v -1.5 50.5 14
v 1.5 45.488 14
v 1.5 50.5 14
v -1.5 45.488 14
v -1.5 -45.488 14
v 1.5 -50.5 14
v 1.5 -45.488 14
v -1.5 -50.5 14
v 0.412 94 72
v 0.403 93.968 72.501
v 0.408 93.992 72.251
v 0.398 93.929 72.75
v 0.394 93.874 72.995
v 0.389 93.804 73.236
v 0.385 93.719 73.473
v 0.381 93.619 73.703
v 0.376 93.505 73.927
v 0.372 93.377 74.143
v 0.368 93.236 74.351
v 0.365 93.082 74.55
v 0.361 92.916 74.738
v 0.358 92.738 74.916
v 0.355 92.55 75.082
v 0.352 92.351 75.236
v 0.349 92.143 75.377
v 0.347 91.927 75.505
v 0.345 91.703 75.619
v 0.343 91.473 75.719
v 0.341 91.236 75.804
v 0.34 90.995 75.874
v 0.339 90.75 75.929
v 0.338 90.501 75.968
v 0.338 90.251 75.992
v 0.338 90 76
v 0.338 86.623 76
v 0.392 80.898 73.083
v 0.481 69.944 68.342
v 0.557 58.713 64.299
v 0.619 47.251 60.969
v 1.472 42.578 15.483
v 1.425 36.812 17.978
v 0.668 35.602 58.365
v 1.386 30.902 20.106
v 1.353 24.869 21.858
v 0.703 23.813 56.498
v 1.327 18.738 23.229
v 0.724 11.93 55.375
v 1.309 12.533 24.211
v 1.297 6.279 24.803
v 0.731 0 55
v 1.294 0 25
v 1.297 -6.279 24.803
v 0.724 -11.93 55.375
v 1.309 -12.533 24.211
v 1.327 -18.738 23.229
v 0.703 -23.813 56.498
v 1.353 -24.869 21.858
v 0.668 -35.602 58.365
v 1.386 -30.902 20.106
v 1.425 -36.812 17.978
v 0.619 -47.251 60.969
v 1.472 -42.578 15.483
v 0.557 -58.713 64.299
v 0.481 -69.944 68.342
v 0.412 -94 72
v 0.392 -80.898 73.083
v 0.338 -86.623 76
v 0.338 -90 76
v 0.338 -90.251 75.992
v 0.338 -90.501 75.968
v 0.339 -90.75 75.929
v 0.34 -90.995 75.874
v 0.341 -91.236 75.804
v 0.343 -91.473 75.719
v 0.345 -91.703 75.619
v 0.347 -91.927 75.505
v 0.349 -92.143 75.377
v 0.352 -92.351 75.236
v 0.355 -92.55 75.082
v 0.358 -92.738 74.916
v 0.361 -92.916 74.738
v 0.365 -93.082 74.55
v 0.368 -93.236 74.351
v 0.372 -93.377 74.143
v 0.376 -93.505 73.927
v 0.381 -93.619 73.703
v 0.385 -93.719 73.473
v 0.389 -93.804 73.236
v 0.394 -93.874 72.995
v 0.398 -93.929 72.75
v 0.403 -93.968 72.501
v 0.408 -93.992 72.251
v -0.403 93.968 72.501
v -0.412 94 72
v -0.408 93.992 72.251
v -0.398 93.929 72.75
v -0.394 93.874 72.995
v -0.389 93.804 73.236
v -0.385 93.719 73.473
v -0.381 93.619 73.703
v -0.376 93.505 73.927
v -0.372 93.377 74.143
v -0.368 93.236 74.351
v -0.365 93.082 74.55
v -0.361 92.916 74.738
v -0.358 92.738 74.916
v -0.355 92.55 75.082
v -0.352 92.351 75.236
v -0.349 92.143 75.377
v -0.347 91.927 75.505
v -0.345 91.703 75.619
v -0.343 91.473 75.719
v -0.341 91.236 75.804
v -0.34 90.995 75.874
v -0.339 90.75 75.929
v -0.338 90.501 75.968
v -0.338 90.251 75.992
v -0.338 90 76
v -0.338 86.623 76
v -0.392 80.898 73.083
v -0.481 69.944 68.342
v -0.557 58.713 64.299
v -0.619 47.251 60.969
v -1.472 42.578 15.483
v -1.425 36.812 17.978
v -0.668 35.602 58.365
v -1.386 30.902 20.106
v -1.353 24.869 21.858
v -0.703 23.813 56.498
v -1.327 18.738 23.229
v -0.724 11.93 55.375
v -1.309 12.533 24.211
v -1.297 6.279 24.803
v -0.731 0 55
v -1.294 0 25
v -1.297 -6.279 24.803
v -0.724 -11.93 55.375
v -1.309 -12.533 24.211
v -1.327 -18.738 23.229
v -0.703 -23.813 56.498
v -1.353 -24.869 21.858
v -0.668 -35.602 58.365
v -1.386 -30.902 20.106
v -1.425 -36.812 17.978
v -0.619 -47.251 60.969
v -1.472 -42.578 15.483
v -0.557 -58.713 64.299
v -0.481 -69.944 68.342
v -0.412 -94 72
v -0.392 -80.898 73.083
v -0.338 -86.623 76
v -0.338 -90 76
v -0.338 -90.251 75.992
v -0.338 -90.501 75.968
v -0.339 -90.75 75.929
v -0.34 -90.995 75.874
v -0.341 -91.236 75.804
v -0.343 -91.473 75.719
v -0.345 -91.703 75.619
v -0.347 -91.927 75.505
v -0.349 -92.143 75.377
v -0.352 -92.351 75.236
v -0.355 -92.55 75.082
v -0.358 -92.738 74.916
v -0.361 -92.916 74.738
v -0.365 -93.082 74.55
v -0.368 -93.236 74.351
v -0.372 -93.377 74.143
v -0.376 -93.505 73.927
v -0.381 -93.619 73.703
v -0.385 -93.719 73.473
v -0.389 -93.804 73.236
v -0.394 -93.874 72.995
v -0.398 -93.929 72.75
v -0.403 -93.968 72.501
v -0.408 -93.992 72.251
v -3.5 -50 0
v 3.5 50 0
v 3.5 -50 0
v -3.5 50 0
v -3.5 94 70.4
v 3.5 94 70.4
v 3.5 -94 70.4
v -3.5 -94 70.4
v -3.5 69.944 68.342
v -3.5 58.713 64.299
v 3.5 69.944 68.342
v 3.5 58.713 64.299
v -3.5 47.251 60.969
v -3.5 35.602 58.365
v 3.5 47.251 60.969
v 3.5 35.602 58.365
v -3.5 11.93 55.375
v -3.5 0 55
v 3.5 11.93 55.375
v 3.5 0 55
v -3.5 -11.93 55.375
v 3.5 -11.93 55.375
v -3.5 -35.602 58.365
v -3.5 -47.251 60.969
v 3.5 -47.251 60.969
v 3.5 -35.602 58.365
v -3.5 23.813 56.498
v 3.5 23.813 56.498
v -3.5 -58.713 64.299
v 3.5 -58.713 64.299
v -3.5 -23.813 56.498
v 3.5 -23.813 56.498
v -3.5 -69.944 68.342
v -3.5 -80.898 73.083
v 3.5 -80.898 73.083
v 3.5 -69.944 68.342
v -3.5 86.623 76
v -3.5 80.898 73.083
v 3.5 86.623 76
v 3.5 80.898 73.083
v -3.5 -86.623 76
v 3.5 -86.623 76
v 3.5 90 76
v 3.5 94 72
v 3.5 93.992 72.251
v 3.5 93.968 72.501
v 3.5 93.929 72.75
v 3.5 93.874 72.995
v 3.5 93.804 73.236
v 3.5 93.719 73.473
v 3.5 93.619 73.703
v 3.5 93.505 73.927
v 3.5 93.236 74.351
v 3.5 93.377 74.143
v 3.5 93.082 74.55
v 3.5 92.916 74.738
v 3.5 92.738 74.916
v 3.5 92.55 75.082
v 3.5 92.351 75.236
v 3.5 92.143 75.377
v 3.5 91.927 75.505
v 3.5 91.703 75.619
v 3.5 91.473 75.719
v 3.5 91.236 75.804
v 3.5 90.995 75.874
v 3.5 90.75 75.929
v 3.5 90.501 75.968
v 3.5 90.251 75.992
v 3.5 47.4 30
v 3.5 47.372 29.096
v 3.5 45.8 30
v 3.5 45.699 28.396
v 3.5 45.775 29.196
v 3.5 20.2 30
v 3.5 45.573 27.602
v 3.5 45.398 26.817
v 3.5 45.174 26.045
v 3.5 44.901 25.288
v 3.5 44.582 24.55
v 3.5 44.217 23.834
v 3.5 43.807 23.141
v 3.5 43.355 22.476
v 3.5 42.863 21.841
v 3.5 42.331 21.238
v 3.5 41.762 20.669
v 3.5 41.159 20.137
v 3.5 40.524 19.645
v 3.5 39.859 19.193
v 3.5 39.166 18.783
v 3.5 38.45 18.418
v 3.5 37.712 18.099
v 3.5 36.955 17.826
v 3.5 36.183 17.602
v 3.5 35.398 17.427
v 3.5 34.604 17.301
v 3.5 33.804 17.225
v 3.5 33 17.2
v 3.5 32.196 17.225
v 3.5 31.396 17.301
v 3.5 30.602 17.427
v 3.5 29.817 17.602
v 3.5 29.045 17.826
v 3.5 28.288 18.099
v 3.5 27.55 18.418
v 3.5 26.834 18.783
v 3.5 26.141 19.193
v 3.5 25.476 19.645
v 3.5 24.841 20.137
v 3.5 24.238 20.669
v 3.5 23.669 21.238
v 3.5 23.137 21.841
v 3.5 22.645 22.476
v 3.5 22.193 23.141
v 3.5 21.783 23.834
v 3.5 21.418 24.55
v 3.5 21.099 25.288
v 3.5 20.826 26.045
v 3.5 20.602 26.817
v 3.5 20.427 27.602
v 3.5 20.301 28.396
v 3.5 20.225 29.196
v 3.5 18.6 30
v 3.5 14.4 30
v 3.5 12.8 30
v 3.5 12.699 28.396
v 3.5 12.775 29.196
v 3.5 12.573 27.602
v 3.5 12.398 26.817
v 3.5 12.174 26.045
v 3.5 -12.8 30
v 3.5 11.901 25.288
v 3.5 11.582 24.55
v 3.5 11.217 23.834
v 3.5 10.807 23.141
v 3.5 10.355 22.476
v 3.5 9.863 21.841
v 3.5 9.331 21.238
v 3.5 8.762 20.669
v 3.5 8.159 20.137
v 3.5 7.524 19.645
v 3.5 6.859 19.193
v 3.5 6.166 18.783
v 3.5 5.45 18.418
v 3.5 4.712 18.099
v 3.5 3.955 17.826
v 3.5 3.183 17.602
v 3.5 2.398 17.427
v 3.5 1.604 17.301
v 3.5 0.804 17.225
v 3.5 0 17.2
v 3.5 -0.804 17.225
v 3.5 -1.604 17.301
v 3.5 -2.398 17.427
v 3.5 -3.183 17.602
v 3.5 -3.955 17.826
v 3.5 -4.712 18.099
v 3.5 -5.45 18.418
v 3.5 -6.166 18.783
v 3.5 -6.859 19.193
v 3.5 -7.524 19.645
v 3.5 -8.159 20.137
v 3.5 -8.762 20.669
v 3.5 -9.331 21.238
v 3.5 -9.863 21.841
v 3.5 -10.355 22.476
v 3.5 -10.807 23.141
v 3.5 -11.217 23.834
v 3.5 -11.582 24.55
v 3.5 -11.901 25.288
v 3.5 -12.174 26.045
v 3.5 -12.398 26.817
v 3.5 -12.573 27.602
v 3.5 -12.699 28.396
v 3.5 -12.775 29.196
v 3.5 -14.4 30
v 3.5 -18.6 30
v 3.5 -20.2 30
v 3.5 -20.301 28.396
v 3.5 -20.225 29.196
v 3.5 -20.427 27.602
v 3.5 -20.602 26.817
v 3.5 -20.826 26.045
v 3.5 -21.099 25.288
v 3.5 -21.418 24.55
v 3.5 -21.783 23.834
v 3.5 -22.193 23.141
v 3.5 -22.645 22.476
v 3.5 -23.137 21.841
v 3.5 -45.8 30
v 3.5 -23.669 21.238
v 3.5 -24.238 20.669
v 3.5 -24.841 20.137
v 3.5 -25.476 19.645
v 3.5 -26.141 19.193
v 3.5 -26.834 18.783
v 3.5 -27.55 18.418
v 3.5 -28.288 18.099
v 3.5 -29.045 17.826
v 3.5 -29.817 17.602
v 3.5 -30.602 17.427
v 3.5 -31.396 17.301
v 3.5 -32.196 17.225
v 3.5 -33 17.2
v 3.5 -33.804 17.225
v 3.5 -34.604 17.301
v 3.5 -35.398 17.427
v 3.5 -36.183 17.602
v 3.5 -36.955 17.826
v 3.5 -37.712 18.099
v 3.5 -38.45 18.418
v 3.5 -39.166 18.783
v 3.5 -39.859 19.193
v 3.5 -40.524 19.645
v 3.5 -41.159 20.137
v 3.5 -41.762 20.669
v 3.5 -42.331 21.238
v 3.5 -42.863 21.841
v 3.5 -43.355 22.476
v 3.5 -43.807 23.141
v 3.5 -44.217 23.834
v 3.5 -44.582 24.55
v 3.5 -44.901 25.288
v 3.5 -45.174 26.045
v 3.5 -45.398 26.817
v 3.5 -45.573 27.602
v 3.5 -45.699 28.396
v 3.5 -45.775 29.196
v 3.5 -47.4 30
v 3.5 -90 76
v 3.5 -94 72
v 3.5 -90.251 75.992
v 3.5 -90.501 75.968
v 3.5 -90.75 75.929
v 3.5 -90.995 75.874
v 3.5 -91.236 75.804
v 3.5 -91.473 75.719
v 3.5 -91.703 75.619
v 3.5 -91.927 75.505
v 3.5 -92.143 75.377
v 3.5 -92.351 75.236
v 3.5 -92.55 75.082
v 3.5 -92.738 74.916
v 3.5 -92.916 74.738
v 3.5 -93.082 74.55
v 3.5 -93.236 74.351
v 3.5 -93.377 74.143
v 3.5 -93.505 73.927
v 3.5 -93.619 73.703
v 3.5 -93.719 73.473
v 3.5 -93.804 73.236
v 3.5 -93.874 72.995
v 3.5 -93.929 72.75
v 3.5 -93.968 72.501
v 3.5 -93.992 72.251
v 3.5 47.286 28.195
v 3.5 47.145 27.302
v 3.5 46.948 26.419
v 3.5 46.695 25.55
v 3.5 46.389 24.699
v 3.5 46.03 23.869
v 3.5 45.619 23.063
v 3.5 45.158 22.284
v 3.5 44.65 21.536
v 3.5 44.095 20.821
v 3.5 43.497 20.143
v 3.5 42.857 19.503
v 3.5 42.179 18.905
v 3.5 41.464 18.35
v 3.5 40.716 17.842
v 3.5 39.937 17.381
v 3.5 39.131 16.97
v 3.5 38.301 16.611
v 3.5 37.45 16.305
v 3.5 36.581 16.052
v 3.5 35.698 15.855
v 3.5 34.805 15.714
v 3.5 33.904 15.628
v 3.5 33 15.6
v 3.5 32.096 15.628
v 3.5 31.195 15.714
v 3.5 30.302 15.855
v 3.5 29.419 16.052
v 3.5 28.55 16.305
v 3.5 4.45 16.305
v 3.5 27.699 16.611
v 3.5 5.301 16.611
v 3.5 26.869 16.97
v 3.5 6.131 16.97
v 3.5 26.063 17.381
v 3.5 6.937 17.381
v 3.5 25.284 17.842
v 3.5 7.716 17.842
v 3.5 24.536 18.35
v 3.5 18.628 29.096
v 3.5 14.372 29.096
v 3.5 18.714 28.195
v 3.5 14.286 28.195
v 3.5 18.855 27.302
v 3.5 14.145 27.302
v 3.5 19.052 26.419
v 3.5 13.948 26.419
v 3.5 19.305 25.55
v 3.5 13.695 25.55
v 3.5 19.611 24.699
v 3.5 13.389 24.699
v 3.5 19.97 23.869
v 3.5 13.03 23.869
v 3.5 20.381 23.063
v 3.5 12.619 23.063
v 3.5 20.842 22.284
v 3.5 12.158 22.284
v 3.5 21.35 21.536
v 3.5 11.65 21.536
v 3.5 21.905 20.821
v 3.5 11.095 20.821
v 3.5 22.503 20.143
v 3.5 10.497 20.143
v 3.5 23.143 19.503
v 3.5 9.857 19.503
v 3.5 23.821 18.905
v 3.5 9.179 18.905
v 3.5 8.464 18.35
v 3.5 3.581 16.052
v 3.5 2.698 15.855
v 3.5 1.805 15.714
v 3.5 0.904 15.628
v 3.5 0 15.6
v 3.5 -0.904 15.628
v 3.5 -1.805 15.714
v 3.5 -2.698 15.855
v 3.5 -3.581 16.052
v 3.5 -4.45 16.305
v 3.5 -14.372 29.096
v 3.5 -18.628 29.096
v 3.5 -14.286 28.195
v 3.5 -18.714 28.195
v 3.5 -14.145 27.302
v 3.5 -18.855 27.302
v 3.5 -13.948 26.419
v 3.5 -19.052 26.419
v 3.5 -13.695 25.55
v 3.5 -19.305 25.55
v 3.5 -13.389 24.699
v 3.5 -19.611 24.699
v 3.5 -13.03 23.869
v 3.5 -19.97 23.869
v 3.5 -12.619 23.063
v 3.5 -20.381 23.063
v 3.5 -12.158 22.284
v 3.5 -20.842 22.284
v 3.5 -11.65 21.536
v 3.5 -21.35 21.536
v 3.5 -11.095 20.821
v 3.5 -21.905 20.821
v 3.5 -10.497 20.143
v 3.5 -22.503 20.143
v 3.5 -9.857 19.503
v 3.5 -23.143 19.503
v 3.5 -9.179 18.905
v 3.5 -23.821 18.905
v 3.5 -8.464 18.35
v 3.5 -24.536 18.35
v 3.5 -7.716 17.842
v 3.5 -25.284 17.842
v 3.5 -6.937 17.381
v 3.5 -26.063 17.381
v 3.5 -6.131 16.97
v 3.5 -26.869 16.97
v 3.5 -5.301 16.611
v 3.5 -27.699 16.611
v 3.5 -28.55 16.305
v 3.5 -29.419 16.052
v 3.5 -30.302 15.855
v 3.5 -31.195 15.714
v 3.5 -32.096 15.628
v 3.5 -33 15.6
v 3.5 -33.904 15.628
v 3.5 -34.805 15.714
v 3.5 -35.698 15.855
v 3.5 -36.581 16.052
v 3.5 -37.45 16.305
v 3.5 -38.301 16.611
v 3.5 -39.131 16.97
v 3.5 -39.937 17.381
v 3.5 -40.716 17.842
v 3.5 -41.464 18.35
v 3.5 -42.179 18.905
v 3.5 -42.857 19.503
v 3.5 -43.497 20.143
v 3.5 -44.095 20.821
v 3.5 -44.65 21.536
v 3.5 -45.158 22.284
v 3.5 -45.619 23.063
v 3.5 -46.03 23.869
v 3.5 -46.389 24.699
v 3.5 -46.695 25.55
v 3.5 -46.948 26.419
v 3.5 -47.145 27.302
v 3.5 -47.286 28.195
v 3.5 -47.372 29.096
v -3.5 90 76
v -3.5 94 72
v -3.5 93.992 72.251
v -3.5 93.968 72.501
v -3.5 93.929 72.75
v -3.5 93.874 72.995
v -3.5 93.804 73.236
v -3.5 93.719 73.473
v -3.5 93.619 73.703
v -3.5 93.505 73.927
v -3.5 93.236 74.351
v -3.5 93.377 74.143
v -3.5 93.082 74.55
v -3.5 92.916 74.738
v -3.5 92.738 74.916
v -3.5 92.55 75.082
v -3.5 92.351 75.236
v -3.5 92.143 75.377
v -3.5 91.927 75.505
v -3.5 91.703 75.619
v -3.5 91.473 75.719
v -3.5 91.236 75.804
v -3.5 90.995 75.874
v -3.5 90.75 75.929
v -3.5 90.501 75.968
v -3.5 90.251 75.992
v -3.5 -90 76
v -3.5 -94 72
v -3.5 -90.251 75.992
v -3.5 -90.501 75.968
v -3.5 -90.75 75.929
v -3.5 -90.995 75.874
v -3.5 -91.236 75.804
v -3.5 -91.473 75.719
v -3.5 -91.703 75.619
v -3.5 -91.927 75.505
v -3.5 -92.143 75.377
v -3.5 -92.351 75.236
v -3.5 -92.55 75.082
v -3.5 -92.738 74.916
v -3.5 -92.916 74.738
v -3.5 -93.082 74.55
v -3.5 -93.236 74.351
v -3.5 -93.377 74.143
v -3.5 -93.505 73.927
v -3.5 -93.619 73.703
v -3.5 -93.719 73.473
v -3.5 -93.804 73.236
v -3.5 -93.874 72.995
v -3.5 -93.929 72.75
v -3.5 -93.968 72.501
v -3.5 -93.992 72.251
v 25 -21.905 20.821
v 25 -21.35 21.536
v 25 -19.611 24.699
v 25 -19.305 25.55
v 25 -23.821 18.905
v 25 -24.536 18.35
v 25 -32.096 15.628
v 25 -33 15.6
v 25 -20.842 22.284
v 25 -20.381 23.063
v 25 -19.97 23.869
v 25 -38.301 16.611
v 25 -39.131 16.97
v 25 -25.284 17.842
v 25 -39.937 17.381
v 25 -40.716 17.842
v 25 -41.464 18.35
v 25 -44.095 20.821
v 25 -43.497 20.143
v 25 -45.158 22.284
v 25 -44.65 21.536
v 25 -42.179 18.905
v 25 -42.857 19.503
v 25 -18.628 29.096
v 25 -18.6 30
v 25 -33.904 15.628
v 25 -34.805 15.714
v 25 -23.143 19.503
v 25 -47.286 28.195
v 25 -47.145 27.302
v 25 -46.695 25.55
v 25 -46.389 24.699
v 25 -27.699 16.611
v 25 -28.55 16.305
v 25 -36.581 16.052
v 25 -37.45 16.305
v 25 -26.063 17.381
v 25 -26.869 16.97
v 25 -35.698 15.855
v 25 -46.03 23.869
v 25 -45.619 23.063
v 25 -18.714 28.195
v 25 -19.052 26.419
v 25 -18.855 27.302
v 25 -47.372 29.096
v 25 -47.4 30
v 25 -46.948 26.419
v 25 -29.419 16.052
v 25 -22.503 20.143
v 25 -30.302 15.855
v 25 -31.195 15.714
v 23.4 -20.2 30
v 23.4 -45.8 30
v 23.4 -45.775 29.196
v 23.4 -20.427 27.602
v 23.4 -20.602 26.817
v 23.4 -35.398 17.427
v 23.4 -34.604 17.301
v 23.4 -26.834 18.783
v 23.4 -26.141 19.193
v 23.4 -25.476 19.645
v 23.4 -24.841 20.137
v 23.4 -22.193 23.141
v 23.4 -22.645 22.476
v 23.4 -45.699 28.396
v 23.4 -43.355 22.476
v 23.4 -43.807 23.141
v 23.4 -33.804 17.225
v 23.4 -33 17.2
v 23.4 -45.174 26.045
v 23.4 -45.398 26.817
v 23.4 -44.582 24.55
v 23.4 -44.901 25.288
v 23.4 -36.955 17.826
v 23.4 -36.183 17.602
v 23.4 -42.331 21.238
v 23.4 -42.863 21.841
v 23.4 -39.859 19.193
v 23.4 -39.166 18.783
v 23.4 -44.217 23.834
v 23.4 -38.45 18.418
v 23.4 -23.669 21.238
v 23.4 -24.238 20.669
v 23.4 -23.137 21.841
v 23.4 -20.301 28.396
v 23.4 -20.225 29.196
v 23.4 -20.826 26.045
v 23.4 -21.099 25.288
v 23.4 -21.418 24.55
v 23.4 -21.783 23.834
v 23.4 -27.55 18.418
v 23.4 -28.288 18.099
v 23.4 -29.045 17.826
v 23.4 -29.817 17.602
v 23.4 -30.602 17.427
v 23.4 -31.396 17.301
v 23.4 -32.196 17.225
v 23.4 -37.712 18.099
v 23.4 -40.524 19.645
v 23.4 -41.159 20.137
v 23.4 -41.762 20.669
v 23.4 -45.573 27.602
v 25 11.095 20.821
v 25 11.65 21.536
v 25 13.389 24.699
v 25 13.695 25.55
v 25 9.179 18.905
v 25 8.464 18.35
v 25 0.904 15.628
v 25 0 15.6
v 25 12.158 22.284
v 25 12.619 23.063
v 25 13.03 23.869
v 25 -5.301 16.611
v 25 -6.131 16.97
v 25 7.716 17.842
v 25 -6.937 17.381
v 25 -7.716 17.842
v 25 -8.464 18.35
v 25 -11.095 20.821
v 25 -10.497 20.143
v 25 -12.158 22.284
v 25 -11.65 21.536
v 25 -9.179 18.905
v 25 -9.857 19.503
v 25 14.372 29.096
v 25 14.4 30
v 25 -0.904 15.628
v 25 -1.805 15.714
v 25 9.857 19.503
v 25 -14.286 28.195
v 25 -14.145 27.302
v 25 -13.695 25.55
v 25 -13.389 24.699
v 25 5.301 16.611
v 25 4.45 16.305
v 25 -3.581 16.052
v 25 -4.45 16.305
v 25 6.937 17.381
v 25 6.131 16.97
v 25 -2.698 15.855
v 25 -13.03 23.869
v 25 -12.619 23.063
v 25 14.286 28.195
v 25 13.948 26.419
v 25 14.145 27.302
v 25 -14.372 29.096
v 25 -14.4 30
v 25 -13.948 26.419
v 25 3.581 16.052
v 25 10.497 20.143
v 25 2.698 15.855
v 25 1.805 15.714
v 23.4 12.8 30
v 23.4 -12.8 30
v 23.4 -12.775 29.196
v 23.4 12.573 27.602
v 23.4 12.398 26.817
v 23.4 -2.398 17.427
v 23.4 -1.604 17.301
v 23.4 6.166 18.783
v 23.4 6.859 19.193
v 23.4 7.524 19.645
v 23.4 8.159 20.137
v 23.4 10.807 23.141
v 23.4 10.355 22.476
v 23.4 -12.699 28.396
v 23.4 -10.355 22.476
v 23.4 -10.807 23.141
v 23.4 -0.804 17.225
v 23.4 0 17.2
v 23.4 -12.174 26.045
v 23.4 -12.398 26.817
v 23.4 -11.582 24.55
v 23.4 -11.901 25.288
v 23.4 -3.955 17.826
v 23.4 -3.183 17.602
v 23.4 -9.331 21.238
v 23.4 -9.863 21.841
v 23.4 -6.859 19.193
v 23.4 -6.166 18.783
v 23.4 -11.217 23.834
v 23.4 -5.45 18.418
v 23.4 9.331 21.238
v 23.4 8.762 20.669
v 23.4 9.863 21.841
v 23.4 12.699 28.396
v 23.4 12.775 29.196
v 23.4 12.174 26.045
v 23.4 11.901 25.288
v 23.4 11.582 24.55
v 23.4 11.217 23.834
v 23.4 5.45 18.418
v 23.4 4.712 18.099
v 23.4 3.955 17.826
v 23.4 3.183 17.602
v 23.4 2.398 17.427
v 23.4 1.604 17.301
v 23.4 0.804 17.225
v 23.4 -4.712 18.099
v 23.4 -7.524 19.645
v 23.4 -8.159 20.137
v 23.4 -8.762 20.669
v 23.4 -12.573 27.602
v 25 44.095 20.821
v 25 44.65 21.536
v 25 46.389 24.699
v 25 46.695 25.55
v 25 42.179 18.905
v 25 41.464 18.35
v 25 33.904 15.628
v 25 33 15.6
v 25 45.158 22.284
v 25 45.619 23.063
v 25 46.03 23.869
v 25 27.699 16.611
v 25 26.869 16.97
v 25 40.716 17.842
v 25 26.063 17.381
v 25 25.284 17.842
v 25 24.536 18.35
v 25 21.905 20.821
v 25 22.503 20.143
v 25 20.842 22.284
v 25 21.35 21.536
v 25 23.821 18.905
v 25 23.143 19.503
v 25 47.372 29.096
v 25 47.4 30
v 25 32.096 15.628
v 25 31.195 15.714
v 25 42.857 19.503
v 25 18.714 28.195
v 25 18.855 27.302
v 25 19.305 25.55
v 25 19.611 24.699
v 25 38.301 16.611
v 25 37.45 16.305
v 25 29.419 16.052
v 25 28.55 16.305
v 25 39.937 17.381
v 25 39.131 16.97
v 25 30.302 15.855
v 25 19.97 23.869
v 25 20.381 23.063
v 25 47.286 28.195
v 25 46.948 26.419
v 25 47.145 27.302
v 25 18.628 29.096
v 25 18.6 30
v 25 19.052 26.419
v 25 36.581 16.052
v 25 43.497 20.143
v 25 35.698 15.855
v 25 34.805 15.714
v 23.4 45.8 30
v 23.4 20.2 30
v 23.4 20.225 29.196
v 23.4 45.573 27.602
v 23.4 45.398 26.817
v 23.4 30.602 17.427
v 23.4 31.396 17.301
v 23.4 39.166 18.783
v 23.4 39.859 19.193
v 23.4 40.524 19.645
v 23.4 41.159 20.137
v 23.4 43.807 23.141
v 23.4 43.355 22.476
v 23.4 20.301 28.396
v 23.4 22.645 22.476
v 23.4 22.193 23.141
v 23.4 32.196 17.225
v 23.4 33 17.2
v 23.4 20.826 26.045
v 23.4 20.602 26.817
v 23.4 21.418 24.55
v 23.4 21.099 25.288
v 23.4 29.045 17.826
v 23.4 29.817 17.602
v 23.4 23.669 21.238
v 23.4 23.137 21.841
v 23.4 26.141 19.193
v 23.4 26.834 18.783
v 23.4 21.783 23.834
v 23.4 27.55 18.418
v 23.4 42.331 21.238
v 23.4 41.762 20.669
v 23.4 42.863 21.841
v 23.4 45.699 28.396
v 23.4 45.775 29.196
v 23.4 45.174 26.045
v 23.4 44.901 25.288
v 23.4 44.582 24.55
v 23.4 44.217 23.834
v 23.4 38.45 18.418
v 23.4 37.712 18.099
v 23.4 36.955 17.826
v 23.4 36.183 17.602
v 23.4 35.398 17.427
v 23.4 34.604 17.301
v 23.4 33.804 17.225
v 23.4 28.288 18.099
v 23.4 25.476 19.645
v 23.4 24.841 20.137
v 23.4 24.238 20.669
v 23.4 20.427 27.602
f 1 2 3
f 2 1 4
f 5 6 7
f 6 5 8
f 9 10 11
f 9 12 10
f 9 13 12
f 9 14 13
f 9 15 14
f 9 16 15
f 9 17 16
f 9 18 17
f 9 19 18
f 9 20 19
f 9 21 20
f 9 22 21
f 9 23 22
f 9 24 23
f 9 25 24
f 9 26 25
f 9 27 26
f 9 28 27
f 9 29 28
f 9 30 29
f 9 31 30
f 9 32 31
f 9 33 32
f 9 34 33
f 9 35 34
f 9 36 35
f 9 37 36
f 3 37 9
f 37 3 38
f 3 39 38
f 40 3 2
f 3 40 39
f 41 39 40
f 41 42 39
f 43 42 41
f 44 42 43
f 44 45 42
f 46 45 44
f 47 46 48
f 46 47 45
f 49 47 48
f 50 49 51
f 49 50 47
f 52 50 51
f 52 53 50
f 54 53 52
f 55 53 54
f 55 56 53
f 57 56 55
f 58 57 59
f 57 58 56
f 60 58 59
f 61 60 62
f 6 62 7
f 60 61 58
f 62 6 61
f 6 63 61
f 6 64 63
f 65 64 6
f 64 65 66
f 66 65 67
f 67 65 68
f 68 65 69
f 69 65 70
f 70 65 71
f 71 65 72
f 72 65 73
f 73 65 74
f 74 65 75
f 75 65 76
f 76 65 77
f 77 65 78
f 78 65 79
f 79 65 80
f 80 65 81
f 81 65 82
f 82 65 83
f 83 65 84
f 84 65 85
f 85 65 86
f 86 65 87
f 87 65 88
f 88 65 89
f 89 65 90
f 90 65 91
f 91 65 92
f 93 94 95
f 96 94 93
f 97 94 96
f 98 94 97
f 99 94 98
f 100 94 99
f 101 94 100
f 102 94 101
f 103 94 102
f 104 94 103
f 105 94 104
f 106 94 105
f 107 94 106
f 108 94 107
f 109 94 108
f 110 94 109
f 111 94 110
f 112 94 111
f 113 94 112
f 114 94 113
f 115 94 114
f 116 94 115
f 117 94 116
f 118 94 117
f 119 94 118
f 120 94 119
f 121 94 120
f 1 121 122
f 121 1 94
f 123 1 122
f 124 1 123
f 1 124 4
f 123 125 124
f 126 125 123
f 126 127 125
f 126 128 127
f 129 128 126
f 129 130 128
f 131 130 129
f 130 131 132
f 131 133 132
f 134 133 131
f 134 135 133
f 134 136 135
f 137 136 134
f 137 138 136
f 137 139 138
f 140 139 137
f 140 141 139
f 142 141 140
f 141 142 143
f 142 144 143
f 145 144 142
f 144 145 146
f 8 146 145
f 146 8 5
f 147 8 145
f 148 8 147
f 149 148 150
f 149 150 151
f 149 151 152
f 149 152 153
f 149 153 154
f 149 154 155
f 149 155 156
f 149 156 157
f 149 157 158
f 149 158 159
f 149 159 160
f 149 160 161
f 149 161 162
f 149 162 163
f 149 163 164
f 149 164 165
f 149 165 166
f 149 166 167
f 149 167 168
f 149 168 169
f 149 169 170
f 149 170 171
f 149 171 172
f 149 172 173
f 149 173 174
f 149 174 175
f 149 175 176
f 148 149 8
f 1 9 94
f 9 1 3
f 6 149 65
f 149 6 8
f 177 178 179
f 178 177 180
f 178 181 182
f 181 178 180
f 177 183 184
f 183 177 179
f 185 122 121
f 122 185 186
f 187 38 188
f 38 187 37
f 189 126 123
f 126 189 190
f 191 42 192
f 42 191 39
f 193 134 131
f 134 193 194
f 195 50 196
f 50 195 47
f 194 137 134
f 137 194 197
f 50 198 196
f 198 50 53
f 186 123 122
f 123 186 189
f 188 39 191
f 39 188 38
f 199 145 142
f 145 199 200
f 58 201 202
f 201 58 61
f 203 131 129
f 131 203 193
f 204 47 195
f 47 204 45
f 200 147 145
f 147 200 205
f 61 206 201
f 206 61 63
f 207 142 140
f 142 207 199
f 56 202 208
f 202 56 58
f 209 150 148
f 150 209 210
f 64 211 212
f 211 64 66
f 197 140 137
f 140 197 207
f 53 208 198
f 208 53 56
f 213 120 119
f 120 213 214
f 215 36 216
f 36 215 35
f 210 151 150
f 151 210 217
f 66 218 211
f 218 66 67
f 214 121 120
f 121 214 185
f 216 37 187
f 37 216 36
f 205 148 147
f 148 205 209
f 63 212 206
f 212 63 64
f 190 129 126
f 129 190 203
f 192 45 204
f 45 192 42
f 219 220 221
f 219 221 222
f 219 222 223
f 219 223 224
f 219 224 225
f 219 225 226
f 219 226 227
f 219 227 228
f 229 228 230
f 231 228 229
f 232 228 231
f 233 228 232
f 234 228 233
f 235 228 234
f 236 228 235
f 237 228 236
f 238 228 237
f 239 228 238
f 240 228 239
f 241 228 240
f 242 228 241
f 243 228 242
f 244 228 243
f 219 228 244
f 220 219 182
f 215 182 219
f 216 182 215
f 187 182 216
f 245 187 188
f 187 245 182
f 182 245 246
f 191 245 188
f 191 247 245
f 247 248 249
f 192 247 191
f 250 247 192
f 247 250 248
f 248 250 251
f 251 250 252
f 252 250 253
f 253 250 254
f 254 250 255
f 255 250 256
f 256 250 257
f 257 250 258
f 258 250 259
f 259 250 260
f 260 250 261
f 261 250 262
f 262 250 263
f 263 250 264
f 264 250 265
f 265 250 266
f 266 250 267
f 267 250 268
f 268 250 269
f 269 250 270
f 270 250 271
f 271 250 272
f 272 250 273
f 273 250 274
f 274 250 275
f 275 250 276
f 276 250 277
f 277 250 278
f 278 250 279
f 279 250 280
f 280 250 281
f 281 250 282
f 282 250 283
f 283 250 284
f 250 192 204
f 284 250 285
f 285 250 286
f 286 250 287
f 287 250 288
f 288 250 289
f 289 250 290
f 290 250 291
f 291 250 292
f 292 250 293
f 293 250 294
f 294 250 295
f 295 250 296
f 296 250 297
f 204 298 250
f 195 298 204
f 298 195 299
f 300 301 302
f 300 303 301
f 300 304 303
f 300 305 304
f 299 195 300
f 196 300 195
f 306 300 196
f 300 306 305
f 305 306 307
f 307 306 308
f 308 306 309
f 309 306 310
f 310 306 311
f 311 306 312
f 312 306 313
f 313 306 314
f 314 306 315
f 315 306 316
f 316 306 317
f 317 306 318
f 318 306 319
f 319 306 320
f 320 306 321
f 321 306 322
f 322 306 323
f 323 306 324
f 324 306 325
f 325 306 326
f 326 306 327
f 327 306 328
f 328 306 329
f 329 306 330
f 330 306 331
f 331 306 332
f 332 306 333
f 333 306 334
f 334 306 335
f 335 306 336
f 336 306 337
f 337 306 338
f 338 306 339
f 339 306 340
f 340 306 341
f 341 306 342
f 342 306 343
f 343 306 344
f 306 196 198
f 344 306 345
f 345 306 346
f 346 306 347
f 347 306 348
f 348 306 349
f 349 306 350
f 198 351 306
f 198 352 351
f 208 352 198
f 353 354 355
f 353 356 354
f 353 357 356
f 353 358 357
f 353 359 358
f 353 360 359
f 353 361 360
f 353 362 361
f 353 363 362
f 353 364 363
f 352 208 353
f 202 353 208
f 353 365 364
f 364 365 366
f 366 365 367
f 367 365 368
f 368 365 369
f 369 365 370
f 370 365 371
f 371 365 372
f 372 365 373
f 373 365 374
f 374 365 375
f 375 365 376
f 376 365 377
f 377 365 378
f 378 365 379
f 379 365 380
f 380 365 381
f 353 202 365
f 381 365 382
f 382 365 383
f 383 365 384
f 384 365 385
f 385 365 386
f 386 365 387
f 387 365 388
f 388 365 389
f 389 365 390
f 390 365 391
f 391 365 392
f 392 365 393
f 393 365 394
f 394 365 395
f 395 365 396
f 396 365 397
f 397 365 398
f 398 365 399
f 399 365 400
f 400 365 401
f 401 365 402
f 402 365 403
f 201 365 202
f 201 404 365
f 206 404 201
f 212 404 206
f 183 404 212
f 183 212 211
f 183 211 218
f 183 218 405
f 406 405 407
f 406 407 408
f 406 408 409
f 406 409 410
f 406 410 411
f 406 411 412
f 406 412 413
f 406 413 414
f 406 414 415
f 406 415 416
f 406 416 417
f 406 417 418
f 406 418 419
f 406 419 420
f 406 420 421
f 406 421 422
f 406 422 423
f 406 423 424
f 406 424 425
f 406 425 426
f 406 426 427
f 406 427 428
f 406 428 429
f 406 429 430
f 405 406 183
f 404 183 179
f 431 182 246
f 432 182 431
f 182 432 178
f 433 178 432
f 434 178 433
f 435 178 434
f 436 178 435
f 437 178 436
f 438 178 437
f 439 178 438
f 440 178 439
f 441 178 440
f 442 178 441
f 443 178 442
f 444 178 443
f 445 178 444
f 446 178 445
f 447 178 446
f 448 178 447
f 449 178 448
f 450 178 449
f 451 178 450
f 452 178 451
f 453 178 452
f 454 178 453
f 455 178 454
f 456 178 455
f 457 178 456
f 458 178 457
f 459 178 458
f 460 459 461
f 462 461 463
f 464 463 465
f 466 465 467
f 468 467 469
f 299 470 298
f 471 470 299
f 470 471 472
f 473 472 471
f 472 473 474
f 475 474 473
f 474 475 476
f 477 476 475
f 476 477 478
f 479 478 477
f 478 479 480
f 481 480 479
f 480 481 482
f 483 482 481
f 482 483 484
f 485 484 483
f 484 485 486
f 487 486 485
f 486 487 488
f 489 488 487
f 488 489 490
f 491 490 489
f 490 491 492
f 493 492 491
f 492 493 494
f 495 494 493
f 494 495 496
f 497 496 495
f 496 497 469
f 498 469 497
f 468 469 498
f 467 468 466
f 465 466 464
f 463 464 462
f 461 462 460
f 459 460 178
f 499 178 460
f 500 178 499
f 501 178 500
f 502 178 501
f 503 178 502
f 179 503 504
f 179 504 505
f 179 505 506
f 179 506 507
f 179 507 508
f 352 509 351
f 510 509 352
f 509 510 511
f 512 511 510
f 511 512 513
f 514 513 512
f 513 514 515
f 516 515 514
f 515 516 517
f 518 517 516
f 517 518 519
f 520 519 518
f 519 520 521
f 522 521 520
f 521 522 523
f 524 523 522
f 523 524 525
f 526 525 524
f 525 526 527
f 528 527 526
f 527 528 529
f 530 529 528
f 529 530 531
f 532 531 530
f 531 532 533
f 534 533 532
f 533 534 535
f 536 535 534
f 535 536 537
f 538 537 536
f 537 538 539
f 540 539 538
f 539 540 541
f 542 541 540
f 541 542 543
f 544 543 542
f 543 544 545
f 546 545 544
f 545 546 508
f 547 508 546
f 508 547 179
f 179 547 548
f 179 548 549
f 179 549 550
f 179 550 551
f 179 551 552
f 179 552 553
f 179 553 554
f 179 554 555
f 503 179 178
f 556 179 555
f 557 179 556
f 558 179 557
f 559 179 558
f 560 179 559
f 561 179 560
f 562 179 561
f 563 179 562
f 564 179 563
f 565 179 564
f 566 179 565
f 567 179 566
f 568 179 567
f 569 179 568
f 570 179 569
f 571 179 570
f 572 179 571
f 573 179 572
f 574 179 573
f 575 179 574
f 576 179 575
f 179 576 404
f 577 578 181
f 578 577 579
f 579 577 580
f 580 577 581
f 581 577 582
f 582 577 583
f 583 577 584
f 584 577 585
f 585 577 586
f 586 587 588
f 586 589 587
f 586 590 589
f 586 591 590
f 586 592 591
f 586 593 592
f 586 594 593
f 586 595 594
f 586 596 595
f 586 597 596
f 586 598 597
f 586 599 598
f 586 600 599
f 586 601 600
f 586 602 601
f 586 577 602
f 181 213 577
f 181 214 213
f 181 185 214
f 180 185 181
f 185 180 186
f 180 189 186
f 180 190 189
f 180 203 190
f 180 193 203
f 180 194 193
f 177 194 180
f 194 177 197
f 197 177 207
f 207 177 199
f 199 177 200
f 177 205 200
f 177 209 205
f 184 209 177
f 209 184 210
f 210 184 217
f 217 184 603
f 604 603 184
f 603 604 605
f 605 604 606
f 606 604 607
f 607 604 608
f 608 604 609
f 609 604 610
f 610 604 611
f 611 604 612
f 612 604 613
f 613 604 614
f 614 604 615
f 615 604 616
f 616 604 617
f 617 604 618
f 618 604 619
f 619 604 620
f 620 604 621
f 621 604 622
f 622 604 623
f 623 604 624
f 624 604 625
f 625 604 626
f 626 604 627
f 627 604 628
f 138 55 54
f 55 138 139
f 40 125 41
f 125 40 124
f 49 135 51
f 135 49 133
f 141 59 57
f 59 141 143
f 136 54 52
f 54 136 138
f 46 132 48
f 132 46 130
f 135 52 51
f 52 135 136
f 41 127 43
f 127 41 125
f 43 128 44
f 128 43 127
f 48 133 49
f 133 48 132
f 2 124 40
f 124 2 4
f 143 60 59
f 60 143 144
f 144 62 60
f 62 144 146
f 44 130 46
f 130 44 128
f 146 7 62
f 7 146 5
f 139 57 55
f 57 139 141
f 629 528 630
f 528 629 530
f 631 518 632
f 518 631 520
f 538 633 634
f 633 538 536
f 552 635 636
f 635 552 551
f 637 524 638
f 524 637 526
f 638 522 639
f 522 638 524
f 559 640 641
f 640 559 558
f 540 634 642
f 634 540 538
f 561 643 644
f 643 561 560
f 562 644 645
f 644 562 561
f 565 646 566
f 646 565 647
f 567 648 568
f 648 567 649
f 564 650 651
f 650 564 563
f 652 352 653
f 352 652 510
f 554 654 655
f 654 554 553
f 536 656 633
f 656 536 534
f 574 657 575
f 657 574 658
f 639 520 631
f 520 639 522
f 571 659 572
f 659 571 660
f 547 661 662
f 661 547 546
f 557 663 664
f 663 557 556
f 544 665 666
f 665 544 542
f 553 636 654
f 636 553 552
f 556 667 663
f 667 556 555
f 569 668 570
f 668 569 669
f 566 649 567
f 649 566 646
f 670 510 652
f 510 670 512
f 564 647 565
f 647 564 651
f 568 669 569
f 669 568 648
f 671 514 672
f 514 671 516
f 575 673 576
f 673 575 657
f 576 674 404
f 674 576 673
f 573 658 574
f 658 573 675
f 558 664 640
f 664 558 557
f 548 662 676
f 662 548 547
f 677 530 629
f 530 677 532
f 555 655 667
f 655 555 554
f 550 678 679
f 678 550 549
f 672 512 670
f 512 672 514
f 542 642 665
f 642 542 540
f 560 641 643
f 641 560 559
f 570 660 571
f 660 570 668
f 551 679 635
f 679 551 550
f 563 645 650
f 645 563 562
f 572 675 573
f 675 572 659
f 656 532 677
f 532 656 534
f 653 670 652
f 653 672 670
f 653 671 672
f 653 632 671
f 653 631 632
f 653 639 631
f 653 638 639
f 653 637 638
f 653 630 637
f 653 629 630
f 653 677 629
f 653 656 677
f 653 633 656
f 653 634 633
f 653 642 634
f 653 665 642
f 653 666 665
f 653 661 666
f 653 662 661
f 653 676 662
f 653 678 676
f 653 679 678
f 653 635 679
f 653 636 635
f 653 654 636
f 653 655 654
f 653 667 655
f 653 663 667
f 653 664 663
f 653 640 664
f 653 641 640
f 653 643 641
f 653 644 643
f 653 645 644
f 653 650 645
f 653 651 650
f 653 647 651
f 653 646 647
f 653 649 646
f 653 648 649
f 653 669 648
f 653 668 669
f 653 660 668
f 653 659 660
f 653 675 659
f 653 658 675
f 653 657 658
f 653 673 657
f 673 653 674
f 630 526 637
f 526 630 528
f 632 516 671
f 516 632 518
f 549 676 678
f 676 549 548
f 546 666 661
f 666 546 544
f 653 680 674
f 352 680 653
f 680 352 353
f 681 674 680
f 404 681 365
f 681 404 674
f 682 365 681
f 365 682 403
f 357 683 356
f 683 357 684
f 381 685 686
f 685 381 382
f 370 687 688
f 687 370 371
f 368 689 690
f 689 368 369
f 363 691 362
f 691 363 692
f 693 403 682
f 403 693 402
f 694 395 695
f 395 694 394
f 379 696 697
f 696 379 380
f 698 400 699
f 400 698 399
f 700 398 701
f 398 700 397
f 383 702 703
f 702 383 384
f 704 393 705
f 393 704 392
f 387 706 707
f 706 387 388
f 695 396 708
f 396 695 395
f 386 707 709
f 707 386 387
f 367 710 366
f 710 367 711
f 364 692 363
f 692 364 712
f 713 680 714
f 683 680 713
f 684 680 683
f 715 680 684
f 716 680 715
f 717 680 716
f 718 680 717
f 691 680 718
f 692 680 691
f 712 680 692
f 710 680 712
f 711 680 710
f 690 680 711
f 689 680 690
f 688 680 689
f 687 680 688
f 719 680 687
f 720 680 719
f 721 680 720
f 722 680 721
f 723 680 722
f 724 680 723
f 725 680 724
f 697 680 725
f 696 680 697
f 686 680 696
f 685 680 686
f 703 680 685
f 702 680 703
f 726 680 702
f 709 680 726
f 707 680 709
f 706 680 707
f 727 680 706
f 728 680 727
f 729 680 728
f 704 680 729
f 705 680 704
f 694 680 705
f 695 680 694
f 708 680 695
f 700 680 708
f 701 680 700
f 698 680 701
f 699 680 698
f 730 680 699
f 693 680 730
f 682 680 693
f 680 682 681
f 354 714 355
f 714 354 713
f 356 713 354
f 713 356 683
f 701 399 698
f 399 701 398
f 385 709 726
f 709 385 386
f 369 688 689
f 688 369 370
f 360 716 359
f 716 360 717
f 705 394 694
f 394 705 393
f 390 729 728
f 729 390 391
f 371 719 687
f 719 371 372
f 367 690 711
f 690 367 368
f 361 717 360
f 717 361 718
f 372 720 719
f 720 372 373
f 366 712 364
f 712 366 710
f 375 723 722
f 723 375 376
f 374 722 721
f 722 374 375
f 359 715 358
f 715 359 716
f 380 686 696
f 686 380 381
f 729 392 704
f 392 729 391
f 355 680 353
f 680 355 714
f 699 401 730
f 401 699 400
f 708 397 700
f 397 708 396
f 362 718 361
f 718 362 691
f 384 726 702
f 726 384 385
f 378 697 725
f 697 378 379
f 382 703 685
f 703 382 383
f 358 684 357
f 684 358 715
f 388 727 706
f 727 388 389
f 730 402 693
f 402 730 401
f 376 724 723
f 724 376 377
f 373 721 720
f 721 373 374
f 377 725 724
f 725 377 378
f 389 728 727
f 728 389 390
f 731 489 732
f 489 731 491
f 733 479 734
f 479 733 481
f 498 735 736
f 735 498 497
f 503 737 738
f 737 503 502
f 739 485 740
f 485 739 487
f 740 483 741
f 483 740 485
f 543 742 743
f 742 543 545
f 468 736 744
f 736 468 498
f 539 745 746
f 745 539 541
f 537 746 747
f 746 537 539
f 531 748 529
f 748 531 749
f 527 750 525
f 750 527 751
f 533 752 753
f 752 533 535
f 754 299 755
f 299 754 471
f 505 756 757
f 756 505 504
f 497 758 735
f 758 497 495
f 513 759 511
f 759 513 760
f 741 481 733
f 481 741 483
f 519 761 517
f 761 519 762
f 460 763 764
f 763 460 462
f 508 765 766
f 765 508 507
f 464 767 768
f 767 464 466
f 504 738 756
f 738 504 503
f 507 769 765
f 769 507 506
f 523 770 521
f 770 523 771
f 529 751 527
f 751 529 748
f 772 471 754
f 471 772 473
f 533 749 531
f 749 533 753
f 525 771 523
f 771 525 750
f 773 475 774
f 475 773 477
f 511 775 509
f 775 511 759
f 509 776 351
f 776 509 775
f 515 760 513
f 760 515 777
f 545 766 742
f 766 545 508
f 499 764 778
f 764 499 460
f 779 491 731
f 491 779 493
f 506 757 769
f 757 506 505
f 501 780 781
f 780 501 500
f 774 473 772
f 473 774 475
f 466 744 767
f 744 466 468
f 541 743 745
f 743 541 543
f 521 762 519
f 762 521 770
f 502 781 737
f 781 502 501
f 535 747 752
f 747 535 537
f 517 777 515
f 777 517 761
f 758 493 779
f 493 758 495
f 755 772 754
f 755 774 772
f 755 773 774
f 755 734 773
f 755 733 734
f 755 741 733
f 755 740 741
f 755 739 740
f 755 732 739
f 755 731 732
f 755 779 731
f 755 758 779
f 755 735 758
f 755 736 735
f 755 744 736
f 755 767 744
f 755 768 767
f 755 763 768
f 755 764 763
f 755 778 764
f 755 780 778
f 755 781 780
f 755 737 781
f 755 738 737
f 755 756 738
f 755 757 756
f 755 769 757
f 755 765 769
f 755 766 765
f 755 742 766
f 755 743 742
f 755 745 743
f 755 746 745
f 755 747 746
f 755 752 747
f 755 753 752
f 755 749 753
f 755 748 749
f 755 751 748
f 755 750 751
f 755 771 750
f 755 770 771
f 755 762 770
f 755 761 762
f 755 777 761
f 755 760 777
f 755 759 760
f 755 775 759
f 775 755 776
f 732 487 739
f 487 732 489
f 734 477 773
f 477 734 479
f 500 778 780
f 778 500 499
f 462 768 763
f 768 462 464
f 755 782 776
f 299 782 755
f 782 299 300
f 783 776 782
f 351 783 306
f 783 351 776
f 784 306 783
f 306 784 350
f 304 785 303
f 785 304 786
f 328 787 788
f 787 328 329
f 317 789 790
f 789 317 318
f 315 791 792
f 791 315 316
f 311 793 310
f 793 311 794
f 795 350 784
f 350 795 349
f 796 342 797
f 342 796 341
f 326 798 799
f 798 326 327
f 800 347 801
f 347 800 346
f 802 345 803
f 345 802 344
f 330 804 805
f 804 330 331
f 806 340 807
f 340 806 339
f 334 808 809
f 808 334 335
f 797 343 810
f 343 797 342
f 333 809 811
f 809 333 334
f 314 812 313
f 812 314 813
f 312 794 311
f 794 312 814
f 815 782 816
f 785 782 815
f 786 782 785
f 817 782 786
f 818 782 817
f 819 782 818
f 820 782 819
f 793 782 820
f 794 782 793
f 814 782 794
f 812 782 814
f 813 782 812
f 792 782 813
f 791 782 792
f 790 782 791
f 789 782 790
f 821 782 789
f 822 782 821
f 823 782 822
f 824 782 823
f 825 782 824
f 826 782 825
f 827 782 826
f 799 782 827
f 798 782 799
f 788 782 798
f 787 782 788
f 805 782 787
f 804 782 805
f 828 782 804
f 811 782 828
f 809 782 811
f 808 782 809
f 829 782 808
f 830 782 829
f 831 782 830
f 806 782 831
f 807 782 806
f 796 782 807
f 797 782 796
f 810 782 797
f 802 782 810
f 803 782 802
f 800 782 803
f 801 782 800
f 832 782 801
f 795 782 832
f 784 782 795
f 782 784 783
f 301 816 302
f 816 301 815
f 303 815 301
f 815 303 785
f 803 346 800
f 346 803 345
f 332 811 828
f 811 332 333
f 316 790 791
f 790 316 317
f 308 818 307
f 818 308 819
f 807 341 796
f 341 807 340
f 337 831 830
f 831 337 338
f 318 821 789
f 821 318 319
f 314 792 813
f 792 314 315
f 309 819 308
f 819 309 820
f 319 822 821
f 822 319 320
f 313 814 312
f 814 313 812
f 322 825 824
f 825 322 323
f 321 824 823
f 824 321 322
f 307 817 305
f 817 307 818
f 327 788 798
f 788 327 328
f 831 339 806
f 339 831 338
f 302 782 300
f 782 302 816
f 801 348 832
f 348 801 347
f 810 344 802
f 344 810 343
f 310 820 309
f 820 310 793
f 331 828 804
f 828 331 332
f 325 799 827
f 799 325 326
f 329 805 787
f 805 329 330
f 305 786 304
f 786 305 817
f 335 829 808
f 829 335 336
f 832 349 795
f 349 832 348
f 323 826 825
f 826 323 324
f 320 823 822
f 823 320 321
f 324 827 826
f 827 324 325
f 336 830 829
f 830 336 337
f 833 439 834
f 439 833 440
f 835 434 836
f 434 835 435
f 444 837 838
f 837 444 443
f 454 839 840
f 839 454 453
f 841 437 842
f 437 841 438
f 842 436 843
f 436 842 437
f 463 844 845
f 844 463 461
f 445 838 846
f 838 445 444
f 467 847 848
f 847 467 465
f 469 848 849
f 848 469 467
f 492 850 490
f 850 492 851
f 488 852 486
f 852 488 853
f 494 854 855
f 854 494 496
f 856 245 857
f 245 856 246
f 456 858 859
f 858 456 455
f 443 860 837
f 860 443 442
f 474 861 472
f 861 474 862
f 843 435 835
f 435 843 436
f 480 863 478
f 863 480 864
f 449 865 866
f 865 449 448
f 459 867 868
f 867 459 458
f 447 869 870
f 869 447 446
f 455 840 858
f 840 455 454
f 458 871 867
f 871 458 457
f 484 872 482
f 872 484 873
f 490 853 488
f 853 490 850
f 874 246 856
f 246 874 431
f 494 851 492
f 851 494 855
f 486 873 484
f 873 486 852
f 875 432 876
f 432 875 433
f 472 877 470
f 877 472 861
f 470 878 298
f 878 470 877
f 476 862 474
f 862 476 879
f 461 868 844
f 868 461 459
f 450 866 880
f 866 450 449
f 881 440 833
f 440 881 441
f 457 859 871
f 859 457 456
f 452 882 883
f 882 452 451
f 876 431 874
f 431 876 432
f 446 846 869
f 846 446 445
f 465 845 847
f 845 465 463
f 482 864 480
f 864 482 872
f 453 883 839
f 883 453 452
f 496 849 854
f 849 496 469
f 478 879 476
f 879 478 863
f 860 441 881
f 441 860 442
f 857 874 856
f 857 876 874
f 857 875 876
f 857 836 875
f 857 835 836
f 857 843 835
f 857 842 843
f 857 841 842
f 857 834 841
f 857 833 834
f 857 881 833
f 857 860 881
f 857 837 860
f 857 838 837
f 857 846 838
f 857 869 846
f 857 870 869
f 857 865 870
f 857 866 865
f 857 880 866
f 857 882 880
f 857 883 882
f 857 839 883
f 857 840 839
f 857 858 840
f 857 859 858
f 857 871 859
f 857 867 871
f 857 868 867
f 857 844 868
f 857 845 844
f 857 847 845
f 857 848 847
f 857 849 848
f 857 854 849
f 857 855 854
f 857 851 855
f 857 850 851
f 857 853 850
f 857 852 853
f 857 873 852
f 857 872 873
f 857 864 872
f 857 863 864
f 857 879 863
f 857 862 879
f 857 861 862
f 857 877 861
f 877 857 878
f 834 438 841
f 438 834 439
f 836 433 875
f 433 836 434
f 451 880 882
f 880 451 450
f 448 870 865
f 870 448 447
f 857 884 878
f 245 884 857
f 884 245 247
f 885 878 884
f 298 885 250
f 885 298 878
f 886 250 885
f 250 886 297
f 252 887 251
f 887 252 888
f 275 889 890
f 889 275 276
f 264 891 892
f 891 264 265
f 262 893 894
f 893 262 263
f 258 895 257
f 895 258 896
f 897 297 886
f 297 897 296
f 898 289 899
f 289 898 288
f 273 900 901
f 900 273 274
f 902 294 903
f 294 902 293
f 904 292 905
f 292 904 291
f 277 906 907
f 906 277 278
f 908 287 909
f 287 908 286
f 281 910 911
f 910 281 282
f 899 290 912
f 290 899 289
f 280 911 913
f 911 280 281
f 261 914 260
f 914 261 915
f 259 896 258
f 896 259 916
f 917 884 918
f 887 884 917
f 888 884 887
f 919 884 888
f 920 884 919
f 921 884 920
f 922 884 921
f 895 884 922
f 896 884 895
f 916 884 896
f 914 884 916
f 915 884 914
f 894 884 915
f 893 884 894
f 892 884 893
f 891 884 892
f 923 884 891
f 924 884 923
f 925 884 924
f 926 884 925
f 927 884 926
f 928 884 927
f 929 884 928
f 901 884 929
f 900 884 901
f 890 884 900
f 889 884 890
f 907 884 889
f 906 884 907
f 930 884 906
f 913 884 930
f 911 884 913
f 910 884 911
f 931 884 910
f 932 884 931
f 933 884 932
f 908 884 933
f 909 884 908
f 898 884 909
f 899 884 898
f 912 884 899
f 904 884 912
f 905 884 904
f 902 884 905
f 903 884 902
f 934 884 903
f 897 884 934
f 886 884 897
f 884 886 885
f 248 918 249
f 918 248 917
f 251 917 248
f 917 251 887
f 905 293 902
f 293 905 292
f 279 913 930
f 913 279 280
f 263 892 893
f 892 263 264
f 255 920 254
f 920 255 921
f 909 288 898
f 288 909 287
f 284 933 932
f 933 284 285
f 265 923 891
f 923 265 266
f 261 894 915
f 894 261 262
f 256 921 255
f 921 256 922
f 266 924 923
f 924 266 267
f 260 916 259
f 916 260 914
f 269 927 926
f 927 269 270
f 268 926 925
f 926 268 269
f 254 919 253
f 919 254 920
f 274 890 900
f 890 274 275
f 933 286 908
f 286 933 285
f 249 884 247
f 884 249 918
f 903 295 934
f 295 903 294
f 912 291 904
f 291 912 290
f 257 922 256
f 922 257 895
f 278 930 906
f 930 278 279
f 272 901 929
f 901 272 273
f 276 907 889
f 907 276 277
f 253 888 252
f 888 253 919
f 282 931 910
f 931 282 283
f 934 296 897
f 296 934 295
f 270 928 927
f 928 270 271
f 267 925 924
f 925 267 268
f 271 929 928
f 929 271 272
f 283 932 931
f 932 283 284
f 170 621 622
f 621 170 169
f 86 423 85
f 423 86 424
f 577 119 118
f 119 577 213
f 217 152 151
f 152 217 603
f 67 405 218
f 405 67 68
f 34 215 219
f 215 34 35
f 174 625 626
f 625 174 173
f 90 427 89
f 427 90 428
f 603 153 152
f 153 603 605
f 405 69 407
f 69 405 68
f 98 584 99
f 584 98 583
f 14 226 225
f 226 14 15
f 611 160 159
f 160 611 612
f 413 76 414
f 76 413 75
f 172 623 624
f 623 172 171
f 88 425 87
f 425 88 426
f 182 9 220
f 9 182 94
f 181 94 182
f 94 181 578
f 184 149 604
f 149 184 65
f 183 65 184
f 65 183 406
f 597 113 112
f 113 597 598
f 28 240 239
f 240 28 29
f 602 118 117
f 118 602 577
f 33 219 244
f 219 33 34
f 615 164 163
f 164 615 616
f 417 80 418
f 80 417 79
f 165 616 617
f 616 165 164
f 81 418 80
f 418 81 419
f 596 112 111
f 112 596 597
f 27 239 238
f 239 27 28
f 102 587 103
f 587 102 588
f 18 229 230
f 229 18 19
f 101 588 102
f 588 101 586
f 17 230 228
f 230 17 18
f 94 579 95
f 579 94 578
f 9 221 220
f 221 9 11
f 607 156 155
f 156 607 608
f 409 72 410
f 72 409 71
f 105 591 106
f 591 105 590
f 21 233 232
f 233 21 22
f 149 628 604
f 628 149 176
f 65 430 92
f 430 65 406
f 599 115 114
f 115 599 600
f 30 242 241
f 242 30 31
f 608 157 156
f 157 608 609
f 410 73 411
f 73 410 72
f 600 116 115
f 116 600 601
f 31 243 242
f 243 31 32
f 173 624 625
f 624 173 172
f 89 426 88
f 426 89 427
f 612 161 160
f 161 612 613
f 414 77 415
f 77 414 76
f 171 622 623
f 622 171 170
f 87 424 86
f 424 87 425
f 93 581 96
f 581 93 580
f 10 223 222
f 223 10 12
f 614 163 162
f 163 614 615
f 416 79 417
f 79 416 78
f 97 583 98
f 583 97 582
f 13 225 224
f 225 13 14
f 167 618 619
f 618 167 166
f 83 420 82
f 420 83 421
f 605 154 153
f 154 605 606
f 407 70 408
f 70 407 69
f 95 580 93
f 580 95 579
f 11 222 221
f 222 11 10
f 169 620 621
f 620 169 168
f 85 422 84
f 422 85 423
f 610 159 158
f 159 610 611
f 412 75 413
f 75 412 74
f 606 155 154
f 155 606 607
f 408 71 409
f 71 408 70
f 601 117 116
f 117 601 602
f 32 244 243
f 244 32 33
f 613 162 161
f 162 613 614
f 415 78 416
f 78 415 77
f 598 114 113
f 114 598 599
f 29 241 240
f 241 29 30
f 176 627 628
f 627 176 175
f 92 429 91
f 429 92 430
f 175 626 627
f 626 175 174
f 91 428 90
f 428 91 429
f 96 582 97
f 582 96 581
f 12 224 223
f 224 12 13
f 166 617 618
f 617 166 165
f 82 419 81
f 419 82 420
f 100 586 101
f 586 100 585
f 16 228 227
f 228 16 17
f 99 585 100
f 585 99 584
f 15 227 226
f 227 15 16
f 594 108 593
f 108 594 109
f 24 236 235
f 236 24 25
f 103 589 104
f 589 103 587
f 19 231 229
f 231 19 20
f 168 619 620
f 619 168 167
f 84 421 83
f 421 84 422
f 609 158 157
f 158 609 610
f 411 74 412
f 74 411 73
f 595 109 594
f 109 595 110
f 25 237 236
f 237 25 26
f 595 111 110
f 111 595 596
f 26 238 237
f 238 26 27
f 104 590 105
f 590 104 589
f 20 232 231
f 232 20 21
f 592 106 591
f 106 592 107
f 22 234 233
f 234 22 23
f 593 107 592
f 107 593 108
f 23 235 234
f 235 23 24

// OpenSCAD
module prism(l, w, h)
{
       polyhedron(
               points=[[0,0,0], [l,0,0], [l,w,0], [0,w,0], [0,w,h], [l,w,h]],
               faces=[[0,1,2,3],[5,4,3,2],[0,4,5,1],[0,3,4],[5,2,1]]
               );
}

module token_holder()
{
    scale(1.6) difference()
    {
        union()
        {
            cylinder(h=14, r=9);
            cylinder(h=0.5, r=9);
        }
        translate([-10, 0, -1]) cube([20, 20, 20]);
        translate([0, 0, 1]) cylinder(h=14, r=8);
        //translate([7, 7, -1]) cylinder(h=16, r=7.5);
    }
}

module tore(smallr, bigr)
{
    rotate_extrude() translate([bigr, 0, 0]) circle(r=smallr);
}

$fn=100;
intersection()
{
    union()
    {
        difference()
        {
            union()
            {
                // Main cube
                translate([-3.5, -100, 0]) cube([7, 200, 80]);
            }
            union()
            {
                // Truncation of the side of the main cube
                translate([-4, 50, 0]) prism(8, 50, 80);
                // Truncation of the other side
                rotate([0, 0, 180]) translate([-4, 50, 0]) prism(8, 50, 80);
                difference()
                {
                    // Inner space for the cards
                    translate([-1.5, 0, 4])
                        union()
                        {
                            translate([3, -100, 10]) rotate([0, 0, 90]) prism(200, 1.5, 80);
                            translate([0, 100, 10]) rotate([0, 0, -90]) prism(200, 1.5, 80);
                        }
                    // The sides are full
                    translate([-3.5, 40, 0]) prism(7, 60, 80);
                    rotate([0, 0, 180]) translate([-3.5, 40, 0]) prism(7, 60, 80);
                }
                // Round truncation of the top
                translate([-4.5, 0, 245]) rotate([0, 90, 0]) cylinder(h=9, r=190);
            }
        }
        // Inside round so that cards make a nice round
        difference()
        {
            translate([-2.5, 0, -75]) rotate([0, 90, 0]) cylinder(h=5, r=100);
            translate([-5, -200, -400]) cube([10, 400, 400]);
            translate([-3.5, 50, 0]) prism(7, 50, 80);
            rotate([0, 0, 180]) translate([-3.5, 50, 0]) prism(7, 50, 80);
        }
        
        translate([25, -33, 30]) rotate([90, 0, -90]) token_holder();
        translate([25, 0, 30]) rotate([90, 0, -90]) token_holder();
        translate([25, 33, 30]) rotate([90, 0, -90]) token_holder();
    }
    translate([-20, 0, 72]) // move it up
        rotate([0, 90, 0]) // rotate it
            translate([0, -90, 0]) // center it
                linear_extrude(height=100) offset(r=4, chamfer=true) square([100, 180]);
}
